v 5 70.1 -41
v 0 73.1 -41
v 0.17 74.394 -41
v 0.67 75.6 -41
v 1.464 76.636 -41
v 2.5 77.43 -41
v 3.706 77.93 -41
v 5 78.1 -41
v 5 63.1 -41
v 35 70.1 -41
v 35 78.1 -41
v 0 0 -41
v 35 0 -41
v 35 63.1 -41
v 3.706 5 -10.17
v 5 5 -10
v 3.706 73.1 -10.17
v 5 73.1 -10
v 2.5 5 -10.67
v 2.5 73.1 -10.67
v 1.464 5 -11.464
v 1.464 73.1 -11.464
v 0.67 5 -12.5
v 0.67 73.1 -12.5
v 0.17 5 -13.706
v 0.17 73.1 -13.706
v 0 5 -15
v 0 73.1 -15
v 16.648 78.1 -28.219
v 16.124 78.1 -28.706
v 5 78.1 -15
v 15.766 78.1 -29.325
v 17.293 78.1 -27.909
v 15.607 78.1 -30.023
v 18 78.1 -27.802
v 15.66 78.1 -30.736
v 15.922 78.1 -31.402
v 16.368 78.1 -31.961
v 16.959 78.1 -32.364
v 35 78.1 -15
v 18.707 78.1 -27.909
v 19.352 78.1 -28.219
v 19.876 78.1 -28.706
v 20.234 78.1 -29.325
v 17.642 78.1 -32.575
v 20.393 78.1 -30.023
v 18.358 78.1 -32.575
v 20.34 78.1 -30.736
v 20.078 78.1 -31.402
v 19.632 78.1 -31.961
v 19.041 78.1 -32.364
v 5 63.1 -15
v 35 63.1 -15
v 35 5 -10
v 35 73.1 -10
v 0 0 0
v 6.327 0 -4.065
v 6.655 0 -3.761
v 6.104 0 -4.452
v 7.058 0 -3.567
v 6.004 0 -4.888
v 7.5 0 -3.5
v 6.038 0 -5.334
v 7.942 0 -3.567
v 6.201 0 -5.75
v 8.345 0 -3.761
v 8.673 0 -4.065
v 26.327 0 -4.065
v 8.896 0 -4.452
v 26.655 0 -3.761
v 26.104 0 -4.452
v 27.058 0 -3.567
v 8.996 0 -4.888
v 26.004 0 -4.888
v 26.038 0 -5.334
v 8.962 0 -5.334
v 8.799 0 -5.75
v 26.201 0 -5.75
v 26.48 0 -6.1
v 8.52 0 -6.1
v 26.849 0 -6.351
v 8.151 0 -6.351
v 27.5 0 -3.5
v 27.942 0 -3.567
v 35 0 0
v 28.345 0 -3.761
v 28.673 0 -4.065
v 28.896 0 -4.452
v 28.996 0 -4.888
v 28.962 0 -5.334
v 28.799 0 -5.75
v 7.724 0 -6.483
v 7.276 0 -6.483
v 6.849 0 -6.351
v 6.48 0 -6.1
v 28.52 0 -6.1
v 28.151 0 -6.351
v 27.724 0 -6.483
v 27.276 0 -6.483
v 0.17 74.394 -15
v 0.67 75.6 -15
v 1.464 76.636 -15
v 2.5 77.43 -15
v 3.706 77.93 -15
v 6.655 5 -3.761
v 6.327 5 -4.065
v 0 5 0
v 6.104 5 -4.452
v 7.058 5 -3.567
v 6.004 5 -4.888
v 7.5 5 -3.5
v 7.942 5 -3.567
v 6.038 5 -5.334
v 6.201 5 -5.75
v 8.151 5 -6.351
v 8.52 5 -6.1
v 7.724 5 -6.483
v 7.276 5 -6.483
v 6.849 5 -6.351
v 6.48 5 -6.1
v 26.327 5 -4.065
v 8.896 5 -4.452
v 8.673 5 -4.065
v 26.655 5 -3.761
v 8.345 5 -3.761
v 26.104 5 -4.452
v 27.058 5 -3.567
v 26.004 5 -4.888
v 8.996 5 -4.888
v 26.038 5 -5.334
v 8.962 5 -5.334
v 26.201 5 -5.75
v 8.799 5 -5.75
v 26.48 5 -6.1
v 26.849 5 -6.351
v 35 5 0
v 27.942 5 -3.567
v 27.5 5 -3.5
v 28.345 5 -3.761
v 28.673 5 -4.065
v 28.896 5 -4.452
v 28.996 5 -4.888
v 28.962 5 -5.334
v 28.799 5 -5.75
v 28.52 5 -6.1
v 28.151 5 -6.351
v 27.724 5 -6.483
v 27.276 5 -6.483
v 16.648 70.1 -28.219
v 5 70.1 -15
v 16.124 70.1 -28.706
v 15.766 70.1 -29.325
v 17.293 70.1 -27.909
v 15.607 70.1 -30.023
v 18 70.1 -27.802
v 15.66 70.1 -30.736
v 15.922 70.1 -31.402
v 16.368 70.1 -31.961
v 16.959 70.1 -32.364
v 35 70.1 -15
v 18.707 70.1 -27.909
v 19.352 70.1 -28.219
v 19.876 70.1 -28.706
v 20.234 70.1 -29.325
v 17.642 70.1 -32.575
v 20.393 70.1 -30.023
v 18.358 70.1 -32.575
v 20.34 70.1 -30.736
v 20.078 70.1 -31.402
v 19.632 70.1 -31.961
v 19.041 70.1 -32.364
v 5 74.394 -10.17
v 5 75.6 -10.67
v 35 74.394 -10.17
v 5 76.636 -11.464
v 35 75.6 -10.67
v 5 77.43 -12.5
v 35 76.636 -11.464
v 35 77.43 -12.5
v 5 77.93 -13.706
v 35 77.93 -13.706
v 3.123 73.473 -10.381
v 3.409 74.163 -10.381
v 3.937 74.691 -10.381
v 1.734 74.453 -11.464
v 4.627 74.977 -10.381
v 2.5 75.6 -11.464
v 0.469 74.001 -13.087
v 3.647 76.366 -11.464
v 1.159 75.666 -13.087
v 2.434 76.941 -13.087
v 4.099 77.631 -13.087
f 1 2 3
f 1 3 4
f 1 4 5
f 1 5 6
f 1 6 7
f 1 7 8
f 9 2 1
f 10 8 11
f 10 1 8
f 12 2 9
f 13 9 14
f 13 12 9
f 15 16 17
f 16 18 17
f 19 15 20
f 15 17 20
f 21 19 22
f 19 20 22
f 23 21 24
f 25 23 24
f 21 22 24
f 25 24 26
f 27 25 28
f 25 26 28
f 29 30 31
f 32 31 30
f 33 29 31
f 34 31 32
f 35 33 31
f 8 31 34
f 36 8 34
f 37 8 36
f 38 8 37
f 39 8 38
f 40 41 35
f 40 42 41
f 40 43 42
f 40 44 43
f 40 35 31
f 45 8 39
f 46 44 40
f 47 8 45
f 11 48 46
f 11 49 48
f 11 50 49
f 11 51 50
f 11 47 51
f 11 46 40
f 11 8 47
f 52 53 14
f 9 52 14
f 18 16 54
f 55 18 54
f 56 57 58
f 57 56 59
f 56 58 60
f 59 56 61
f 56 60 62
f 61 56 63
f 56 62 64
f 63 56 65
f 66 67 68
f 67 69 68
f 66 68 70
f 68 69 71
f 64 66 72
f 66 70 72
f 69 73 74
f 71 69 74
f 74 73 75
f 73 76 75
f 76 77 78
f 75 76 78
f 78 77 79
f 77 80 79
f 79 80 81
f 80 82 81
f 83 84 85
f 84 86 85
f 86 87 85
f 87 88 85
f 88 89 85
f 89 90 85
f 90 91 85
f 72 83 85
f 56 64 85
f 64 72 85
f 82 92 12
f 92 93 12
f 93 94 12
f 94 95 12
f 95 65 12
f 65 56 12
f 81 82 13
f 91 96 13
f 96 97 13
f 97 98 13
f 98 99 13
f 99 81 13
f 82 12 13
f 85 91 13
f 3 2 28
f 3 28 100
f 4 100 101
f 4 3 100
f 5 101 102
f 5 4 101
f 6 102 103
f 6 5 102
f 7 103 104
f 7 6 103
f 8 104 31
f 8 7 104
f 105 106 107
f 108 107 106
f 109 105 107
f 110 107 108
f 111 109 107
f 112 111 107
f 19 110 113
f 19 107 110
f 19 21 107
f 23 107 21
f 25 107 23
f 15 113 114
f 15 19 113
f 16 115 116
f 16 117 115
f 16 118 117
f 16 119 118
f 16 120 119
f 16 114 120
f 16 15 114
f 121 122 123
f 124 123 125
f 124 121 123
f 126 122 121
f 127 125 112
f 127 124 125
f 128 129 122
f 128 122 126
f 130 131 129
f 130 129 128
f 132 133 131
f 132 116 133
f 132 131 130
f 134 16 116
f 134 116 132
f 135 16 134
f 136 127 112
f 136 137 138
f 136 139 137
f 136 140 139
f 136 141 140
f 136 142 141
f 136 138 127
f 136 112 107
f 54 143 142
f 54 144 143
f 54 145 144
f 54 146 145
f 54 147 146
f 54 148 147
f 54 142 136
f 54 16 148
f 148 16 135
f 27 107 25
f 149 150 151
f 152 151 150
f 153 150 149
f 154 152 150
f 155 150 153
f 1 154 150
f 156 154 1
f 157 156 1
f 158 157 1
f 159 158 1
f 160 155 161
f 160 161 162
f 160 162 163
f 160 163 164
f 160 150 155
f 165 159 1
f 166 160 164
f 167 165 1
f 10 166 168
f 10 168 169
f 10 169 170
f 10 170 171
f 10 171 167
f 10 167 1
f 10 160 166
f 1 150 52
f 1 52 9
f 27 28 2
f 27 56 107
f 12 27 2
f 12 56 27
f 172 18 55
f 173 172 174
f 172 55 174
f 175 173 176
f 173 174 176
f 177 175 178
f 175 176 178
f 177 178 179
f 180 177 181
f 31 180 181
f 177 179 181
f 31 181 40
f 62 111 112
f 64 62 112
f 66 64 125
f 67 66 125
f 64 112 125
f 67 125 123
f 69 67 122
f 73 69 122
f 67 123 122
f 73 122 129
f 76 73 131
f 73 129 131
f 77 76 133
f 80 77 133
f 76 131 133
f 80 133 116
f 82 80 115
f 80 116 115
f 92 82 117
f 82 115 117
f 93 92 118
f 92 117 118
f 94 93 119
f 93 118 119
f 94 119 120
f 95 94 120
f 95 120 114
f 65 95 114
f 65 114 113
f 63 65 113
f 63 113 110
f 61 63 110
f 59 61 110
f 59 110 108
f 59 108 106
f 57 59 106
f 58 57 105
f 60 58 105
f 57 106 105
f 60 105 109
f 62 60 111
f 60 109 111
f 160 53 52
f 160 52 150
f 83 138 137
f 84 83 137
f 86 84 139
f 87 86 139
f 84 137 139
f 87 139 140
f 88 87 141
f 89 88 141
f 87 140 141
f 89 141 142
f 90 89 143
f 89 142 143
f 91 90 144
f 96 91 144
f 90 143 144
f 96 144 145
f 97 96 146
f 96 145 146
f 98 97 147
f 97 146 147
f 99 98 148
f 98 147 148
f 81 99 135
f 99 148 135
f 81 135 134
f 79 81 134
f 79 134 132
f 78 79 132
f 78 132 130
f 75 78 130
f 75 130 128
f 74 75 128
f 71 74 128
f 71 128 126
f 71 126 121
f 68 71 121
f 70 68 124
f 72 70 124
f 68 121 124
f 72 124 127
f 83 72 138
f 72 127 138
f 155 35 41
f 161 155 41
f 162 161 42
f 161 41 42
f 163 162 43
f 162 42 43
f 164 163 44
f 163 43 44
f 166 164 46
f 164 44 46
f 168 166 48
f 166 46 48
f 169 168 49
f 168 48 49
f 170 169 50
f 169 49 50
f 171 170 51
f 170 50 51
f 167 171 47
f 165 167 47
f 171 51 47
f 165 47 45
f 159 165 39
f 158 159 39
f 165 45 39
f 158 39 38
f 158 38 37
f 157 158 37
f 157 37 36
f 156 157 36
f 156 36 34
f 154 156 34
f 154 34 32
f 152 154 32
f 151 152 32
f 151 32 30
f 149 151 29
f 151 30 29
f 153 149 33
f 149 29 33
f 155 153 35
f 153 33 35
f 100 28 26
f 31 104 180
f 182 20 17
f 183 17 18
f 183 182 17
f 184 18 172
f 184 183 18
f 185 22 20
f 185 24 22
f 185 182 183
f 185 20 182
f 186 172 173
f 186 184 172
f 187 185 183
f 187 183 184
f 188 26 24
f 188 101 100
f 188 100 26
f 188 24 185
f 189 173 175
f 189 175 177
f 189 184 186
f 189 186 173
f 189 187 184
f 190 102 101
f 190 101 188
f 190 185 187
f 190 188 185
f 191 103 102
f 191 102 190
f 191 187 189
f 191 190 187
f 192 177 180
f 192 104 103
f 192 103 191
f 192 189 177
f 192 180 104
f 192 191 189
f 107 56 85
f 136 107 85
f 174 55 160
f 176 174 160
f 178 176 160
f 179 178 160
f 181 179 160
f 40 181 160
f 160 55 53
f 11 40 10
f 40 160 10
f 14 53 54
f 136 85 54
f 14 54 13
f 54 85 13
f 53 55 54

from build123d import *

# Parameters (mm, degrees)
SKETCH1_W           = 35
SKETCH1_H           = 41
BOSS_EXTRUDE1_DEPTH = 5
SKETCH2_R           = 1.5
CUT_EXTRUDE1_DEPTH  = 5
SKETCH3_W           = 35
SKETCH3_H           = 31
BOSS_EXTRUDE2_DEPTH = 73.1
SKETCH4_W           = 26
SKETCH4_H           = 7
CUT_EXTRUDE2_DEPTH  = 30
SKETCH5_R           = 2.4
CUT_EXTRUDE3_DEPTH  = 8
FILLET1_R           = 5
FILLET2_R           = 5


with BuildPart() as part:
    # Sketch1 → Boss-Extrude1 (new body)
    with BuildSketch(Plane(origin=(0, 0, 0), x_dir=(1, 0, 0), z_dir=(0, 1, 0))):
        with Locations((17.5, 20.5)):
            Rectangle(SKETCH1_W, SKETCH1_H)
    extrude(amount=BOSS_EXTRUDE1_DEPTH)

    # Sketch2 → Cut-Extrude1 (cut)
    with BuildSketch(Plane(origin=(0, 5, 0), x_dir=(1, 0, 0), z_dir=(0, 1, 0))):
        with Locations(Location((7.5, 5, 0), (0, 0, 270))):
            Circle(SKETCH2_R)
        with Locations(Location((27.5, 5, 0), (0, 0, 270))):
            Circle(SKETCH2_R)
    extrude(amount=-CUT_EXTRUDE1_DEPTH, mode=Mode.SUBTRACT)

    # Sketch3 → Boss-Extrude2 (add)
    with BuildSketch(Plane(origin=(0, 5, 0), x_dir=(1, 0, 0), z_dir=(0, 1, 0))):
        with Locations((17.5, 25.5)):
            Rectangle(SKETCH3_W, SKETCH3_H)
    extrude(amount=BOSS_EXTRUDE2_DEPTH)

    # Sketch4 → Cut-Extrude2 (cut)
    with BuildSketch(Plane(origin=(35, 0, 0), x_dir=(0, 0, -1), z_dir=(1, 0, 0))):
        with Locations((28, 66.6)):
            Rectangle(SKETCH4_W, SKETCH4_H)
    extrude(amount=-CUT_EXTRUDE2_DEPTH, mode=Mode.SUBTRACT)

    # Sketch5 → Cut-Extrude3 (cut)
    with BuildSketch(Plane(origin=(0, 78.1, 0), x_dir=(1, 0, 0), z_dir=(0, 1, 0))):
        with Locations(Location((18, 30.202102686, 0), (0, 0, 270))):
            Circle(SKETCH5_R)
    extrude(amount=-CUT_EXTRUDE3_DEPTH, mode=Mode.SUBTRACT)

    # Fillet1
    fillet1_edges = [part.edges().sort_by_distance(p)[0] for p in [
        (0, 78.1, -25.5),
    ]]
    fillet(fillet1_edges, radius=FILLET1_R)

    # Fillet2
    fillet2_edges = [part.edges().sort_by_distance(p)[0] for p in [
        (20, 78.1, -10),
        (0, 39.05, -10),
        (1.464466094, 76.635533906, -10),
    ]]
    fillet(fillet2_edges, radius=FILLET2_R)


solid = part.part
